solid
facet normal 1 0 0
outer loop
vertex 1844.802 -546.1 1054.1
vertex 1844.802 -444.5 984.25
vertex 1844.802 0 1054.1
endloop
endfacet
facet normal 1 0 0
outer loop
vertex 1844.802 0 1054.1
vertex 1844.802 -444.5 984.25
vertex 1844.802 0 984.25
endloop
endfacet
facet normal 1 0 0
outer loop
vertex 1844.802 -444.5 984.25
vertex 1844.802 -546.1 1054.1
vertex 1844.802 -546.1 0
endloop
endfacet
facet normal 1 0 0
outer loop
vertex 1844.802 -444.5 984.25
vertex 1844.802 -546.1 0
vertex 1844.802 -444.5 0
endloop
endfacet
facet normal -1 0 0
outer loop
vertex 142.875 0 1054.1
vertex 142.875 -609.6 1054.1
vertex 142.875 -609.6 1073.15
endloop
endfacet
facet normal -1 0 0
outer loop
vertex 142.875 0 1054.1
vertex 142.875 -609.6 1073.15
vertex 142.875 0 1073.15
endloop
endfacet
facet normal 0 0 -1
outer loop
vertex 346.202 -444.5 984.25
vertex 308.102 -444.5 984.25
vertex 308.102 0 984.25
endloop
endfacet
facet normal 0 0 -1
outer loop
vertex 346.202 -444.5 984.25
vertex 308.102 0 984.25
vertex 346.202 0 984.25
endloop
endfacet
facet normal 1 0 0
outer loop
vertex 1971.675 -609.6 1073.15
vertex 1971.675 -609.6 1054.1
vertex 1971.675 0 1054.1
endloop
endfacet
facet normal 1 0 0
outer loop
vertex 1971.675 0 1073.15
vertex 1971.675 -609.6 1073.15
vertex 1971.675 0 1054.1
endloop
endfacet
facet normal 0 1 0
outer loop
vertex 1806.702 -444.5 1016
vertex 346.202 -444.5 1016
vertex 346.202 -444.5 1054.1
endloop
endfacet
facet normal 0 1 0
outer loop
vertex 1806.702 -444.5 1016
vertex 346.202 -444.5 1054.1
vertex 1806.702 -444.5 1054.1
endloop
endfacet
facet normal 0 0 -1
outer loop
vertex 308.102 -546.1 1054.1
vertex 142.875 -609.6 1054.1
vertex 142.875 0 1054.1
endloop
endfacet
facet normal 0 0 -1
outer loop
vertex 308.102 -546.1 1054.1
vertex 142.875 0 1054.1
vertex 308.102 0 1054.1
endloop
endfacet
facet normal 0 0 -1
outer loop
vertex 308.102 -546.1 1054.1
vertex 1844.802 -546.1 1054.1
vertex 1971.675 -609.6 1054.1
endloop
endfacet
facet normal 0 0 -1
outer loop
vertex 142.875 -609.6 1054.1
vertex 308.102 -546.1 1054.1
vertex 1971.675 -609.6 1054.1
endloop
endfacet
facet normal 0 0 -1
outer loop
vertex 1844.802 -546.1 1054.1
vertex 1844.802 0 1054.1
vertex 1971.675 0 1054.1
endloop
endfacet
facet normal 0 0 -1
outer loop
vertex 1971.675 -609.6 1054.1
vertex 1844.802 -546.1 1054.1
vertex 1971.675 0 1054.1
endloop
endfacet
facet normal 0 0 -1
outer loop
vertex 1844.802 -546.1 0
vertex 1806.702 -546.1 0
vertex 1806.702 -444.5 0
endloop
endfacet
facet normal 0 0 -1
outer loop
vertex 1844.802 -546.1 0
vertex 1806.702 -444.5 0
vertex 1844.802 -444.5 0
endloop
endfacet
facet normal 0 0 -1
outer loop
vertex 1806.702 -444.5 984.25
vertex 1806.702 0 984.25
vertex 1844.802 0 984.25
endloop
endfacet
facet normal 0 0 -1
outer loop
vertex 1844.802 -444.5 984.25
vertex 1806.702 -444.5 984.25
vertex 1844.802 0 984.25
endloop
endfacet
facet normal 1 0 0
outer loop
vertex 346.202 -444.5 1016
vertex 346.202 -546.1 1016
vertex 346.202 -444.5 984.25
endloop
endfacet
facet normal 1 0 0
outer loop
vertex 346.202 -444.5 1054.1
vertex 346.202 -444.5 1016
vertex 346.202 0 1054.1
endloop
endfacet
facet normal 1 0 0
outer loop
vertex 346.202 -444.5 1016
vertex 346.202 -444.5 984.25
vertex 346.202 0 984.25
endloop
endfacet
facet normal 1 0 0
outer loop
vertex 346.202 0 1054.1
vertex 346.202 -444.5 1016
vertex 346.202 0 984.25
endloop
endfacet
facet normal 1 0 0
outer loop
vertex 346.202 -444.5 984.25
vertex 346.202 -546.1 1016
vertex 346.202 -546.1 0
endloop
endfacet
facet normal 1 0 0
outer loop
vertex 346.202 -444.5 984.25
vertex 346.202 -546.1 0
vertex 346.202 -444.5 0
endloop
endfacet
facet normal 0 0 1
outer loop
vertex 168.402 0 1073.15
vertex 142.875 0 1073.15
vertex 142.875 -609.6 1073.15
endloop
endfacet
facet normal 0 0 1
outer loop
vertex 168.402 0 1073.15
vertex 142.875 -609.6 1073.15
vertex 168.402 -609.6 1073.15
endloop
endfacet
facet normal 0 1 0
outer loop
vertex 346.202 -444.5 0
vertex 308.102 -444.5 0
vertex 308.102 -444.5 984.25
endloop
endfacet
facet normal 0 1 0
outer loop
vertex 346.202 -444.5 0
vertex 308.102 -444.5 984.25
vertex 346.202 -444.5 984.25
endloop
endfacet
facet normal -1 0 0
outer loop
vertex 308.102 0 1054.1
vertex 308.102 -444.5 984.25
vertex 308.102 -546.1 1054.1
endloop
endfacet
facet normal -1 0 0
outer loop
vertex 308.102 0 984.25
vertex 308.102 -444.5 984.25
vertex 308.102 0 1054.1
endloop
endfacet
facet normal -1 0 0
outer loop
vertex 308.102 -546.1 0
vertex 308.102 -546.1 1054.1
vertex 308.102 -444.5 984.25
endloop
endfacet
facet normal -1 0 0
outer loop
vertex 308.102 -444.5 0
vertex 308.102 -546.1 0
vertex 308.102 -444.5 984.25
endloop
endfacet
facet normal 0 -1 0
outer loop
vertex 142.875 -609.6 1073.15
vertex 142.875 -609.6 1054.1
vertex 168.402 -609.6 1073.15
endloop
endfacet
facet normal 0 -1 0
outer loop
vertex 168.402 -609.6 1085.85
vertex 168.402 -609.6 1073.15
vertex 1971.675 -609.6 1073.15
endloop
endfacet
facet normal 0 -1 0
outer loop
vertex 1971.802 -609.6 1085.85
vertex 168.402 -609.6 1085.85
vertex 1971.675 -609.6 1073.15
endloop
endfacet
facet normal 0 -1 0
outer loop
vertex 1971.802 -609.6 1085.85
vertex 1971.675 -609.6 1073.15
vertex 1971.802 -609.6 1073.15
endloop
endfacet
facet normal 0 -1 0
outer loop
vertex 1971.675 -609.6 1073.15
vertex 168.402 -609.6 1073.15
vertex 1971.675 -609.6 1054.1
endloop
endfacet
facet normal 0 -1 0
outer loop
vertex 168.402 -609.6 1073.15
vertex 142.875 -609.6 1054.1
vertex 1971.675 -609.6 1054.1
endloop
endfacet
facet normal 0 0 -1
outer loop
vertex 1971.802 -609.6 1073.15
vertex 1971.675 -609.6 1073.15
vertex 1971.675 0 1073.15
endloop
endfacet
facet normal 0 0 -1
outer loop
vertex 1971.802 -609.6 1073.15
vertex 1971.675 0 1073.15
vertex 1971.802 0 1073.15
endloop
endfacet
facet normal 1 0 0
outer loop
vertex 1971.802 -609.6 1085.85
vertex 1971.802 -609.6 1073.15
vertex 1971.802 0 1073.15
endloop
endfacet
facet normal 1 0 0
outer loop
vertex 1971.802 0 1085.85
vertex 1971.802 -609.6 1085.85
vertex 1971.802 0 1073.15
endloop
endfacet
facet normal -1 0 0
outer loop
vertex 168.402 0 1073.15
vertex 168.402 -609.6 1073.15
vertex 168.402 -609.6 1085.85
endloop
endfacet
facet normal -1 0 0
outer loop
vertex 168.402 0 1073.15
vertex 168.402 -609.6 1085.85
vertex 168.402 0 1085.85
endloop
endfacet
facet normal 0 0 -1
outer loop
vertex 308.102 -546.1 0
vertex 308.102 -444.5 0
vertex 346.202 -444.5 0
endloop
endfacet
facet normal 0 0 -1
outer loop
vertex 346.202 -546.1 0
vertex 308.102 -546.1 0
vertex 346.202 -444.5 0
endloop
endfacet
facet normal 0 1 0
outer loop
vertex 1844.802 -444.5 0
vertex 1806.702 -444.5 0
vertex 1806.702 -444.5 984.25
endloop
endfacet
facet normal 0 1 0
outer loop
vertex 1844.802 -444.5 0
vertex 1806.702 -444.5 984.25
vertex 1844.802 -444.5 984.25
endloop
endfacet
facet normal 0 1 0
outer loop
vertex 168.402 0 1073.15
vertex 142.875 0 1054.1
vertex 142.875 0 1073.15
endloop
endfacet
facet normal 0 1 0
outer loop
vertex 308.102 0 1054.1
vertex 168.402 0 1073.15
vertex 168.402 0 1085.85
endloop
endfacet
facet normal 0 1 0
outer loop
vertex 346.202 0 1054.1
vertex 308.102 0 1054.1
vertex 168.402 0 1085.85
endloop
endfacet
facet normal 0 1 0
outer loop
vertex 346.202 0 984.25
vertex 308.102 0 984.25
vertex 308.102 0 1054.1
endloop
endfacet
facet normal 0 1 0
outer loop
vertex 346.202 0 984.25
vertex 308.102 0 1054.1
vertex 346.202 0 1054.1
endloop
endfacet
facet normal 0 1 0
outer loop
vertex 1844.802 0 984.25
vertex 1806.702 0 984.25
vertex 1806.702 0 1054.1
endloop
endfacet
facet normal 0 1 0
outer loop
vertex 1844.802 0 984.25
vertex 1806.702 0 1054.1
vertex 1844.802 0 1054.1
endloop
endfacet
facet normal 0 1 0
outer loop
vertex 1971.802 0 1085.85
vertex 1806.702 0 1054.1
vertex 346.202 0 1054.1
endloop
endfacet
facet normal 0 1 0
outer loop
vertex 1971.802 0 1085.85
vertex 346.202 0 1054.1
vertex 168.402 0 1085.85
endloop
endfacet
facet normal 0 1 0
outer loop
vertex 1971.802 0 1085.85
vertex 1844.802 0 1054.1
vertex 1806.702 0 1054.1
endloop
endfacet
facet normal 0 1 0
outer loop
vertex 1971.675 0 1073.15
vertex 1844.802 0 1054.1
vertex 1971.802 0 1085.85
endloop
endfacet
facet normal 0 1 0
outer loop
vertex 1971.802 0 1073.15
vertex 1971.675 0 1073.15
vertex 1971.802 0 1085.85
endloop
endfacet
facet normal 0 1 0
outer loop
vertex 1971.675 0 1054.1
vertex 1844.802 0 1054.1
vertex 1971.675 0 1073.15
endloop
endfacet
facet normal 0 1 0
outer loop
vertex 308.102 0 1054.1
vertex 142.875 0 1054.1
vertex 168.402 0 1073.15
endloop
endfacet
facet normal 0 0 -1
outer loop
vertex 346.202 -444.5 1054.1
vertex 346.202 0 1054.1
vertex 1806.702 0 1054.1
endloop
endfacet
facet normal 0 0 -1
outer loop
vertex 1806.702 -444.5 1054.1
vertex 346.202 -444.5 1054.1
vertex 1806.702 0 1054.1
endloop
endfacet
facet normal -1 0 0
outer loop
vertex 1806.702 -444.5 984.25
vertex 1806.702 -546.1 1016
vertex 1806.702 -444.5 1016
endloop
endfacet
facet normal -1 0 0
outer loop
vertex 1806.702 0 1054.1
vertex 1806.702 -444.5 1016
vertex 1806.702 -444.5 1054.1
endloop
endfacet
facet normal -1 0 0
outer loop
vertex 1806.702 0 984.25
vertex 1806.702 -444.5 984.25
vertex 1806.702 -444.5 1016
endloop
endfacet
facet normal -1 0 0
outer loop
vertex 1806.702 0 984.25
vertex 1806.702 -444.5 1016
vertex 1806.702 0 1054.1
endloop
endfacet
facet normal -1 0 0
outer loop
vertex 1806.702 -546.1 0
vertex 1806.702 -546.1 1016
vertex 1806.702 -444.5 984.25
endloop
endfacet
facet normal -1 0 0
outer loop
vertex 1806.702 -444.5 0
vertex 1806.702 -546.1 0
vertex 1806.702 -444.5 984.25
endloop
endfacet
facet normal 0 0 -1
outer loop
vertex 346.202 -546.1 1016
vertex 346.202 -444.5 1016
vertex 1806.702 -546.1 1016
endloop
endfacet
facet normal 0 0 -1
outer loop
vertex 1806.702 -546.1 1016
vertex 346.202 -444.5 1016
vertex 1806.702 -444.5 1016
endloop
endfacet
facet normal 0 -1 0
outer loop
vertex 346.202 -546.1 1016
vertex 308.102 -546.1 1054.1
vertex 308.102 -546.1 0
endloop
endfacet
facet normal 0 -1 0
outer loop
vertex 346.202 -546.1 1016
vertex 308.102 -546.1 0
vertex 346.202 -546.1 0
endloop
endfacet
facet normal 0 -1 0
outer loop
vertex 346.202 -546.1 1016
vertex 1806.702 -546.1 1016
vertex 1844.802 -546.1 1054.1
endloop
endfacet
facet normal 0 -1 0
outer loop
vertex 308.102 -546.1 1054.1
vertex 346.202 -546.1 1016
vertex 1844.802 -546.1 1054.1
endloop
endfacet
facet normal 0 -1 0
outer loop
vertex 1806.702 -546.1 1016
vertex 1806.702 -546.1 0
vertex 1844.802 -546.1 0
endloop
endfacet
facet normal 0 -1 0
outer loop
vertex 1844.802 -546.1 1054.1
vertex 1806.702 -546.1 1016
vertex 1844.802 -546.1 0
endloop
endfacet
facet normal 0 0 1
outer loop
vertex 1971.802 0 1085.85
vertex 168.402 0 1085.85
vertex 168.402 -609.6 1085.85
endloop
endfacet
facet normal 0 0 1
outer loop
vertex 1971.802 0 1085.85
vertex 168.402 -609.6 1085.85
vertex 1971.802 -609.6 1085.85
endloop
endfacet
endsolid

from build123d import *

# Parameters (mm, degrees)
BOX011_W     = 38.1
BOX011_H     = 546.1
BOX011_DEPTH = 69.85
BOX010_W     = 38.1
BOX010_H     = 101.6
BOX010_DEPTH = 1054.1
BOX013_W     = 38.1
BOX013_H     = 546.1
BOX013_DEPTH = 69.85
BOX012_W     = 38.1
BOX012_H     = 101.6
BOX012_DEPTH = 1054.1
BOX014_W     = 1460.5
BOX014_H     = 101.6
BOX014_DEPTH = 38.1
BOX009_W     = 1803.4
BOX009_H     = 609.6
BOX009_DEPTH = 12.7
BOX008_W     = 1828.8
BOX008_H     = 609.6
BOX008_DEPTH = 19.05


with BuildPart() as cube005:
    # Box011 → Box011 (new body)
    with BuildSketch(Plane(origin=(308.102, -546.1, 984.25), x_dir=(1, 0, 0), z_dir=(0, 0, 1))):
        with Locations((19.05, 273.05)):
            Rectangle(BOX011_W, BOX011_H)
    extrude(amount=BOX011_DEPTH)


with BuildPart() as tableleg:
    # Box010 → Box010 (new body)
    with BuildSketch(Plane(origin=(308.102, -546.1, 0), x_dir=(1, 0, 0), z_dir=(0, 0, 1))):
        with Locations((19.05, 50.8)):
            Rectangle(BOX010_W, BOX010_H)
    extrude(amount=BOX010_DEPTH)

    # Fusion002: union Cube005
    add(cube005.part)


with BuildPart() as cube007:
    # Box013 → Box013 (new body)
    with BuildSketch(Plane(origin=(1806.702, -546.1, 984.25), x_dir=(1, 0, 0), z_dir=(0, 0, 1))):
        with Locations((19.05, 273.05)):
            Rectangle(BOX013_W, BOX013_H)
    extrude(amount=BOX013_DEPTH)


with BuildPart() as tableleg2:
    # Box012 → Box012 (new body)
    with BuildSketch(Plane(origin=(1806.702, -546.1, 0), x_dir=(1, 0, 0), z_dir=(0, 0, 1))):
        with Locations((19.05, 50.8)):
            Rectangle(BOX012_W, BOX012_H)
    extrude(amount=BOX012_DEPTH)

    # Fusion003: union Cube007
    add(cube007.part)


with BuildPart() as cube008:
    # Box014 → Box014 (new body)
    with BuildSketch(Plane(origin=(346.202, -546.1, 1016), x_dir=(1, 0, 0), z_dir=(0, 0, 1))):
        with Locations((730.25, 50.8)):
            Rectangle(BOX014_W, BOX014_H)
    extrude(amount=BOX014_DEPTH)


with BuildPart() as cube003:
    # Box009 → Box009 (new body)
    with BuildSketch(Plane(origin=(168.402, -609.6, 1073.15), x_dir=(1, 0, 0), z_dir=(0, 0, 1))):
        with Locations((901.7, 304.8)):
            Rectangle(BOX009_W, BOX009_H)
    extrude(amount=BOX009_DEPTH)


with BuildPart() as table:
    # Box008 → Box008 (new body)
    with BuildSketch(Plane(origin=(142.875, -609.6, 1054.1), x_dir=(1, 0, 0), z_dir=(0, 0, 1))):
        with Locations((914.4, 304.8)):
            Rectangle(BOX008_W, BOX008_H)
    extrude(amount=BOX008_DEPTH)

    # Fusion: union Cube003
    add(cube003.part)

    # Fusion004: union TableLeg, TableLeg2, Cube008
    add(tableleg.part)
    add(tableleg2.part)
    add(cube008.part)


solid = table.part
